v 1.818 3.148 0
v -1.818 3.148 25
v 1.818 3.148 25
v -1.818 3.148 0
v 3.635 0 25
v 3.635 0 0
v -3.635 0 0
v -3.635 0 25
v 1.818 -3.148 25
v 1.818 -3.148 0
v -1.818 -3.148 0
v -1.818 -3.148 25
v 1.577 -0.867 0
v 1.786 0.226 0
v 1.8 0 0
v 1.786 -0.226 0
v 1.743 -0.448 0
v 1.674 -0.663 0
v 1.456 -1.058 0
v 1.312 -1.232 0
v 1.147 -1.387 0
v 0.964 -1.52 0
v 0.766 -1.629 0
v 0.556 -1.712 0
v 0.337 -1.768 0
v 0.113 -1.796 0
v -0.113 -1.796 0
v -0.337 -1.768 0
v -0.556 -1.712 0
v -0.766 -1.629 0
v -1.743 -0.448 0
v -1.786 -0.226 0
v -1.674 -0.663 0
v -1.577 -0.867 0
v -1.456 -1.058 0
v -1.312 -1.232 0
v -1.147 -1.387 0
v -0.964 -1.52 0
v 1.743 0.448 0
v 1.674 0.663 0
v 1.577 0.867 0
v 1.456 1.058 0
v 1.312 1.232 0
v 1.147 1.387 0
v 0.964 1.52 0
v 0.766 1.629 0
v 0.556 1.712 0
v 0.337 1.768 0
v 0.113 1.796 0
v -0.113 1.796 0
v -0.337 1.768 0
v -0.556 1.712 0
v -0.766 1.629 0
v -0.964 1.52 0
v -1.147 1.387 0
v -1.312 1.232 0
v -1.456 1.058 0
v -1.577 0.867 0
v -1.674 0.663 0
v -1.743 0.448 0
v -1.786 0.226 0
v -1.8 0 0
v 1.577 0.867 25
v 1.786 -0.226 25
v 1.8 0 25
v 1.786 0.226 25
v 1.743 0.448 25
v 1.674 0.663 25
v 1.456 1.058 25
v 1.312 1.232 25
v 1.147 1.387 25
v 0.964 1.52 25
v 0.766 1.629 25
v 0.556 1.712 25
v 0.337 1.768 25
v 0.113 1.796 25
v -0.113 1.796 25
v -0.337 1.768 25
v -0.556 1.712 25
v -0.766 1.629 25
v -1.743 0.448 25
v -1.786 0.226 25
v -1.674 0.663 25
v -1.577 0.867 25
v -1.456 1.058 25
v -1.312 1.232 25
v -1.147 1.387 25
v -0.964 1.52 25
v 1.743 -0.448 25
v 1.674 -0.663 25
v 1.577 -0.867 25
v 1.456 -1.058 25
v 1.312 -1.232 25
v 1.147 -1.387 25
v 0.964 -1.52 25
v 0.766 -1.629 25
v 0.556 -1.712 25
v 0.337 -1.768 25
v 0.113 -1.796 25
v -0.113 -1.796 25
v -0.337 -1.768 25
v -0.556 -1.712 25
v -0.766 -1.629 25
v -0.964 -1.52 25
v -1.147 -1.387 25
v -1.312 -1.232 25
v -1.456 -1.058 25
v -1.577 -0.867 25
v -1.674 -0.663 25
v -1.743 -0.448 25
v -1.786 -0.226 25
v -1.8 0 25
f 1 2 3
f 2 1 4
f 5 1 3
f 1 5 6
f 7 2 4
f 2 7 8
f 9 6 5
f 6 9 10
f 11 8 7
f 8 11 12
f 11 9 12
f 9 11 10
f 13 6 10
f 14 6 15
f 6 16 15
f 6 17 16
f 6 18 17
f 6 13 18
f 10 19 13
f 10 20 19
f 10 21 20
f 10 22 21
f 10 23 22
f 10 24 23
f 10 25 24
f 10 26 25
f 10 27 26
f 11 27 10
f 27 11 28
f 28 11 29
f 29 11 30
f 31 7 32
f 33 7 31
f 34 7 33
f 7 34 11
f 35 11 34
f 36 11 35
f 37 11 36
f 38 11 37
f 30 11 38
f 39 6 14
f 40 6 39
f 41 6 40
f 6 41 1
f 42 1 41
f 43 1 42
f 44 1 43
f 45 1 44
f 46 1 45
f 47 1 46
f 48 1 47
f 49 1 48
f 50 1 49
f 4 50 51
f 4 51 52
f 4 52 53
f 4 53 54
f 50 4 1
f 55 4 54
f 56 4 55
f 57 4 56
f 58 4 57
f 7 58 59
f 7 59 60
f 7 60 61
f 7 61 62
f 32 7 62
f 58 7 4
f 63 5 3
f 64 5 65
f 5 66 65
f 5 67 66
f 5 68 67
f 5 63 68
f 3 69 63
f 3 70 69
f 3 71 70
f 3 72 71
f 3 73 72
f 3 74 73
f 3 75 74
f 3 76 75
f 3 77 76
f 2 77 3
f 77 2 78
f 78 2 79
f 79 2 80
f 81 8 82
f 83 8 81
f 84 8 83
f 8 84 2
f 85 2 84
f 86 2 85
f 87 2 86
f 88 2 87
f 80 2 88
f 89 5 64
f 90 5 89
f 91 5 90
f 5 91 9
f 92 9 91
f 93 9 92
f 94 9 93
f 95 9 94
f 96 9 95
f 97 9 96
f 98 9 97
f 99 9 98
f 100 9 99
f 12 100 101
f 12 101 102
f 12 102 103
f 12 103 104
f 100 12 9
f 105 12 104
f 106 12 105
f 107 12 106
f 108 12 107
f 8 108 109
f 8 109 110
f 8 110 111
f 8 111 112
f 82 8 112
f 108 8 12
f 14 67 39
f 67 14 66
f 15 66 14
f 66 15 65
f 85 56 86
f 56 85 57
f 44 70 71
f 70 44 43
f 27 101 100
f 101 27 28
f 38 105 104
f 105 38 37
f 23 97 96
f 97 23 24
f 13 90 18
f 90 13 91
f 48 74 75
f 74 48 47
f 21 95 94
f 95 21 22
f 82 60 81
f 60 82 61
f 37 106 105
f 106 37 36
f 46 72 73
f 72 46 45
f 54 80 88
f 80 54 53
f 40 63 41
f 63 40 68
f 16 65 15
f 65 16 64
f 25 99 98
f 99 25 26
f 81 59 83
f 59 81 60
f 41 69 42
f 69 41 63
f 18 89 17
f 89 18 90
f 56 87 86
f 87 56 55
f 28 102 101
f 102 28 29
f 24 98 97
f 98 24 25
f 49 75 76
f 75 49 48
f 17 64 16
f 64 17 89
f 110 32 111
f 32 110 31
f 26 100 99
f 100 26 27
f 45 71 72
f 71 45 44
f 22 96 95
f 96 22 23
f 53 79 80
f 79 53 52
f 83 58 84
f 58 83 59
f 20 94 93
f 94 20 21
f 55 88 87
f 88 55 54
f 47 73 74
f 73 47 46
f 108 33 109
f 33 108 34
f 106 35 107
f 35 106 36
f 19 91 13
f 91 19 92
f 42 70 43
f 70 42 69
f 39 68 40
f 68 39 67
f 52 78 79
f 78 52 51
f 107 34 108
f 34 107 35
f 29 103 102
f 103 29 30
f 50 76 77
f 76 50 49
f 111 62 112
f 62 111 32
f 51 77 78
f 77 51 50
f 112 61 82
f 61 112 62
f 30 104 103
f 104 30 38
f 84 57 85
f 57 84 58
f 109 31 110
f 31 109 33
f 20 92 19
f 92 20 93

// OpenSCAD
$fn = 50;


difference() {
	union() {
		linear_extrude(height = 25) {
			polygon(points = [[3.6351000000, 0.0000000000], [1.8175500000, 3.1480889453], [-1.8175500000, 3.1480889453], [-3.6351000000, 0.0000000000], [-1.8175500000, -3.1480889453], [1.8175500000, -3.1480889453]]);
		}
	}
	union() {
		cylinder(h = 25, r = 1.8000000000);
	}
}
